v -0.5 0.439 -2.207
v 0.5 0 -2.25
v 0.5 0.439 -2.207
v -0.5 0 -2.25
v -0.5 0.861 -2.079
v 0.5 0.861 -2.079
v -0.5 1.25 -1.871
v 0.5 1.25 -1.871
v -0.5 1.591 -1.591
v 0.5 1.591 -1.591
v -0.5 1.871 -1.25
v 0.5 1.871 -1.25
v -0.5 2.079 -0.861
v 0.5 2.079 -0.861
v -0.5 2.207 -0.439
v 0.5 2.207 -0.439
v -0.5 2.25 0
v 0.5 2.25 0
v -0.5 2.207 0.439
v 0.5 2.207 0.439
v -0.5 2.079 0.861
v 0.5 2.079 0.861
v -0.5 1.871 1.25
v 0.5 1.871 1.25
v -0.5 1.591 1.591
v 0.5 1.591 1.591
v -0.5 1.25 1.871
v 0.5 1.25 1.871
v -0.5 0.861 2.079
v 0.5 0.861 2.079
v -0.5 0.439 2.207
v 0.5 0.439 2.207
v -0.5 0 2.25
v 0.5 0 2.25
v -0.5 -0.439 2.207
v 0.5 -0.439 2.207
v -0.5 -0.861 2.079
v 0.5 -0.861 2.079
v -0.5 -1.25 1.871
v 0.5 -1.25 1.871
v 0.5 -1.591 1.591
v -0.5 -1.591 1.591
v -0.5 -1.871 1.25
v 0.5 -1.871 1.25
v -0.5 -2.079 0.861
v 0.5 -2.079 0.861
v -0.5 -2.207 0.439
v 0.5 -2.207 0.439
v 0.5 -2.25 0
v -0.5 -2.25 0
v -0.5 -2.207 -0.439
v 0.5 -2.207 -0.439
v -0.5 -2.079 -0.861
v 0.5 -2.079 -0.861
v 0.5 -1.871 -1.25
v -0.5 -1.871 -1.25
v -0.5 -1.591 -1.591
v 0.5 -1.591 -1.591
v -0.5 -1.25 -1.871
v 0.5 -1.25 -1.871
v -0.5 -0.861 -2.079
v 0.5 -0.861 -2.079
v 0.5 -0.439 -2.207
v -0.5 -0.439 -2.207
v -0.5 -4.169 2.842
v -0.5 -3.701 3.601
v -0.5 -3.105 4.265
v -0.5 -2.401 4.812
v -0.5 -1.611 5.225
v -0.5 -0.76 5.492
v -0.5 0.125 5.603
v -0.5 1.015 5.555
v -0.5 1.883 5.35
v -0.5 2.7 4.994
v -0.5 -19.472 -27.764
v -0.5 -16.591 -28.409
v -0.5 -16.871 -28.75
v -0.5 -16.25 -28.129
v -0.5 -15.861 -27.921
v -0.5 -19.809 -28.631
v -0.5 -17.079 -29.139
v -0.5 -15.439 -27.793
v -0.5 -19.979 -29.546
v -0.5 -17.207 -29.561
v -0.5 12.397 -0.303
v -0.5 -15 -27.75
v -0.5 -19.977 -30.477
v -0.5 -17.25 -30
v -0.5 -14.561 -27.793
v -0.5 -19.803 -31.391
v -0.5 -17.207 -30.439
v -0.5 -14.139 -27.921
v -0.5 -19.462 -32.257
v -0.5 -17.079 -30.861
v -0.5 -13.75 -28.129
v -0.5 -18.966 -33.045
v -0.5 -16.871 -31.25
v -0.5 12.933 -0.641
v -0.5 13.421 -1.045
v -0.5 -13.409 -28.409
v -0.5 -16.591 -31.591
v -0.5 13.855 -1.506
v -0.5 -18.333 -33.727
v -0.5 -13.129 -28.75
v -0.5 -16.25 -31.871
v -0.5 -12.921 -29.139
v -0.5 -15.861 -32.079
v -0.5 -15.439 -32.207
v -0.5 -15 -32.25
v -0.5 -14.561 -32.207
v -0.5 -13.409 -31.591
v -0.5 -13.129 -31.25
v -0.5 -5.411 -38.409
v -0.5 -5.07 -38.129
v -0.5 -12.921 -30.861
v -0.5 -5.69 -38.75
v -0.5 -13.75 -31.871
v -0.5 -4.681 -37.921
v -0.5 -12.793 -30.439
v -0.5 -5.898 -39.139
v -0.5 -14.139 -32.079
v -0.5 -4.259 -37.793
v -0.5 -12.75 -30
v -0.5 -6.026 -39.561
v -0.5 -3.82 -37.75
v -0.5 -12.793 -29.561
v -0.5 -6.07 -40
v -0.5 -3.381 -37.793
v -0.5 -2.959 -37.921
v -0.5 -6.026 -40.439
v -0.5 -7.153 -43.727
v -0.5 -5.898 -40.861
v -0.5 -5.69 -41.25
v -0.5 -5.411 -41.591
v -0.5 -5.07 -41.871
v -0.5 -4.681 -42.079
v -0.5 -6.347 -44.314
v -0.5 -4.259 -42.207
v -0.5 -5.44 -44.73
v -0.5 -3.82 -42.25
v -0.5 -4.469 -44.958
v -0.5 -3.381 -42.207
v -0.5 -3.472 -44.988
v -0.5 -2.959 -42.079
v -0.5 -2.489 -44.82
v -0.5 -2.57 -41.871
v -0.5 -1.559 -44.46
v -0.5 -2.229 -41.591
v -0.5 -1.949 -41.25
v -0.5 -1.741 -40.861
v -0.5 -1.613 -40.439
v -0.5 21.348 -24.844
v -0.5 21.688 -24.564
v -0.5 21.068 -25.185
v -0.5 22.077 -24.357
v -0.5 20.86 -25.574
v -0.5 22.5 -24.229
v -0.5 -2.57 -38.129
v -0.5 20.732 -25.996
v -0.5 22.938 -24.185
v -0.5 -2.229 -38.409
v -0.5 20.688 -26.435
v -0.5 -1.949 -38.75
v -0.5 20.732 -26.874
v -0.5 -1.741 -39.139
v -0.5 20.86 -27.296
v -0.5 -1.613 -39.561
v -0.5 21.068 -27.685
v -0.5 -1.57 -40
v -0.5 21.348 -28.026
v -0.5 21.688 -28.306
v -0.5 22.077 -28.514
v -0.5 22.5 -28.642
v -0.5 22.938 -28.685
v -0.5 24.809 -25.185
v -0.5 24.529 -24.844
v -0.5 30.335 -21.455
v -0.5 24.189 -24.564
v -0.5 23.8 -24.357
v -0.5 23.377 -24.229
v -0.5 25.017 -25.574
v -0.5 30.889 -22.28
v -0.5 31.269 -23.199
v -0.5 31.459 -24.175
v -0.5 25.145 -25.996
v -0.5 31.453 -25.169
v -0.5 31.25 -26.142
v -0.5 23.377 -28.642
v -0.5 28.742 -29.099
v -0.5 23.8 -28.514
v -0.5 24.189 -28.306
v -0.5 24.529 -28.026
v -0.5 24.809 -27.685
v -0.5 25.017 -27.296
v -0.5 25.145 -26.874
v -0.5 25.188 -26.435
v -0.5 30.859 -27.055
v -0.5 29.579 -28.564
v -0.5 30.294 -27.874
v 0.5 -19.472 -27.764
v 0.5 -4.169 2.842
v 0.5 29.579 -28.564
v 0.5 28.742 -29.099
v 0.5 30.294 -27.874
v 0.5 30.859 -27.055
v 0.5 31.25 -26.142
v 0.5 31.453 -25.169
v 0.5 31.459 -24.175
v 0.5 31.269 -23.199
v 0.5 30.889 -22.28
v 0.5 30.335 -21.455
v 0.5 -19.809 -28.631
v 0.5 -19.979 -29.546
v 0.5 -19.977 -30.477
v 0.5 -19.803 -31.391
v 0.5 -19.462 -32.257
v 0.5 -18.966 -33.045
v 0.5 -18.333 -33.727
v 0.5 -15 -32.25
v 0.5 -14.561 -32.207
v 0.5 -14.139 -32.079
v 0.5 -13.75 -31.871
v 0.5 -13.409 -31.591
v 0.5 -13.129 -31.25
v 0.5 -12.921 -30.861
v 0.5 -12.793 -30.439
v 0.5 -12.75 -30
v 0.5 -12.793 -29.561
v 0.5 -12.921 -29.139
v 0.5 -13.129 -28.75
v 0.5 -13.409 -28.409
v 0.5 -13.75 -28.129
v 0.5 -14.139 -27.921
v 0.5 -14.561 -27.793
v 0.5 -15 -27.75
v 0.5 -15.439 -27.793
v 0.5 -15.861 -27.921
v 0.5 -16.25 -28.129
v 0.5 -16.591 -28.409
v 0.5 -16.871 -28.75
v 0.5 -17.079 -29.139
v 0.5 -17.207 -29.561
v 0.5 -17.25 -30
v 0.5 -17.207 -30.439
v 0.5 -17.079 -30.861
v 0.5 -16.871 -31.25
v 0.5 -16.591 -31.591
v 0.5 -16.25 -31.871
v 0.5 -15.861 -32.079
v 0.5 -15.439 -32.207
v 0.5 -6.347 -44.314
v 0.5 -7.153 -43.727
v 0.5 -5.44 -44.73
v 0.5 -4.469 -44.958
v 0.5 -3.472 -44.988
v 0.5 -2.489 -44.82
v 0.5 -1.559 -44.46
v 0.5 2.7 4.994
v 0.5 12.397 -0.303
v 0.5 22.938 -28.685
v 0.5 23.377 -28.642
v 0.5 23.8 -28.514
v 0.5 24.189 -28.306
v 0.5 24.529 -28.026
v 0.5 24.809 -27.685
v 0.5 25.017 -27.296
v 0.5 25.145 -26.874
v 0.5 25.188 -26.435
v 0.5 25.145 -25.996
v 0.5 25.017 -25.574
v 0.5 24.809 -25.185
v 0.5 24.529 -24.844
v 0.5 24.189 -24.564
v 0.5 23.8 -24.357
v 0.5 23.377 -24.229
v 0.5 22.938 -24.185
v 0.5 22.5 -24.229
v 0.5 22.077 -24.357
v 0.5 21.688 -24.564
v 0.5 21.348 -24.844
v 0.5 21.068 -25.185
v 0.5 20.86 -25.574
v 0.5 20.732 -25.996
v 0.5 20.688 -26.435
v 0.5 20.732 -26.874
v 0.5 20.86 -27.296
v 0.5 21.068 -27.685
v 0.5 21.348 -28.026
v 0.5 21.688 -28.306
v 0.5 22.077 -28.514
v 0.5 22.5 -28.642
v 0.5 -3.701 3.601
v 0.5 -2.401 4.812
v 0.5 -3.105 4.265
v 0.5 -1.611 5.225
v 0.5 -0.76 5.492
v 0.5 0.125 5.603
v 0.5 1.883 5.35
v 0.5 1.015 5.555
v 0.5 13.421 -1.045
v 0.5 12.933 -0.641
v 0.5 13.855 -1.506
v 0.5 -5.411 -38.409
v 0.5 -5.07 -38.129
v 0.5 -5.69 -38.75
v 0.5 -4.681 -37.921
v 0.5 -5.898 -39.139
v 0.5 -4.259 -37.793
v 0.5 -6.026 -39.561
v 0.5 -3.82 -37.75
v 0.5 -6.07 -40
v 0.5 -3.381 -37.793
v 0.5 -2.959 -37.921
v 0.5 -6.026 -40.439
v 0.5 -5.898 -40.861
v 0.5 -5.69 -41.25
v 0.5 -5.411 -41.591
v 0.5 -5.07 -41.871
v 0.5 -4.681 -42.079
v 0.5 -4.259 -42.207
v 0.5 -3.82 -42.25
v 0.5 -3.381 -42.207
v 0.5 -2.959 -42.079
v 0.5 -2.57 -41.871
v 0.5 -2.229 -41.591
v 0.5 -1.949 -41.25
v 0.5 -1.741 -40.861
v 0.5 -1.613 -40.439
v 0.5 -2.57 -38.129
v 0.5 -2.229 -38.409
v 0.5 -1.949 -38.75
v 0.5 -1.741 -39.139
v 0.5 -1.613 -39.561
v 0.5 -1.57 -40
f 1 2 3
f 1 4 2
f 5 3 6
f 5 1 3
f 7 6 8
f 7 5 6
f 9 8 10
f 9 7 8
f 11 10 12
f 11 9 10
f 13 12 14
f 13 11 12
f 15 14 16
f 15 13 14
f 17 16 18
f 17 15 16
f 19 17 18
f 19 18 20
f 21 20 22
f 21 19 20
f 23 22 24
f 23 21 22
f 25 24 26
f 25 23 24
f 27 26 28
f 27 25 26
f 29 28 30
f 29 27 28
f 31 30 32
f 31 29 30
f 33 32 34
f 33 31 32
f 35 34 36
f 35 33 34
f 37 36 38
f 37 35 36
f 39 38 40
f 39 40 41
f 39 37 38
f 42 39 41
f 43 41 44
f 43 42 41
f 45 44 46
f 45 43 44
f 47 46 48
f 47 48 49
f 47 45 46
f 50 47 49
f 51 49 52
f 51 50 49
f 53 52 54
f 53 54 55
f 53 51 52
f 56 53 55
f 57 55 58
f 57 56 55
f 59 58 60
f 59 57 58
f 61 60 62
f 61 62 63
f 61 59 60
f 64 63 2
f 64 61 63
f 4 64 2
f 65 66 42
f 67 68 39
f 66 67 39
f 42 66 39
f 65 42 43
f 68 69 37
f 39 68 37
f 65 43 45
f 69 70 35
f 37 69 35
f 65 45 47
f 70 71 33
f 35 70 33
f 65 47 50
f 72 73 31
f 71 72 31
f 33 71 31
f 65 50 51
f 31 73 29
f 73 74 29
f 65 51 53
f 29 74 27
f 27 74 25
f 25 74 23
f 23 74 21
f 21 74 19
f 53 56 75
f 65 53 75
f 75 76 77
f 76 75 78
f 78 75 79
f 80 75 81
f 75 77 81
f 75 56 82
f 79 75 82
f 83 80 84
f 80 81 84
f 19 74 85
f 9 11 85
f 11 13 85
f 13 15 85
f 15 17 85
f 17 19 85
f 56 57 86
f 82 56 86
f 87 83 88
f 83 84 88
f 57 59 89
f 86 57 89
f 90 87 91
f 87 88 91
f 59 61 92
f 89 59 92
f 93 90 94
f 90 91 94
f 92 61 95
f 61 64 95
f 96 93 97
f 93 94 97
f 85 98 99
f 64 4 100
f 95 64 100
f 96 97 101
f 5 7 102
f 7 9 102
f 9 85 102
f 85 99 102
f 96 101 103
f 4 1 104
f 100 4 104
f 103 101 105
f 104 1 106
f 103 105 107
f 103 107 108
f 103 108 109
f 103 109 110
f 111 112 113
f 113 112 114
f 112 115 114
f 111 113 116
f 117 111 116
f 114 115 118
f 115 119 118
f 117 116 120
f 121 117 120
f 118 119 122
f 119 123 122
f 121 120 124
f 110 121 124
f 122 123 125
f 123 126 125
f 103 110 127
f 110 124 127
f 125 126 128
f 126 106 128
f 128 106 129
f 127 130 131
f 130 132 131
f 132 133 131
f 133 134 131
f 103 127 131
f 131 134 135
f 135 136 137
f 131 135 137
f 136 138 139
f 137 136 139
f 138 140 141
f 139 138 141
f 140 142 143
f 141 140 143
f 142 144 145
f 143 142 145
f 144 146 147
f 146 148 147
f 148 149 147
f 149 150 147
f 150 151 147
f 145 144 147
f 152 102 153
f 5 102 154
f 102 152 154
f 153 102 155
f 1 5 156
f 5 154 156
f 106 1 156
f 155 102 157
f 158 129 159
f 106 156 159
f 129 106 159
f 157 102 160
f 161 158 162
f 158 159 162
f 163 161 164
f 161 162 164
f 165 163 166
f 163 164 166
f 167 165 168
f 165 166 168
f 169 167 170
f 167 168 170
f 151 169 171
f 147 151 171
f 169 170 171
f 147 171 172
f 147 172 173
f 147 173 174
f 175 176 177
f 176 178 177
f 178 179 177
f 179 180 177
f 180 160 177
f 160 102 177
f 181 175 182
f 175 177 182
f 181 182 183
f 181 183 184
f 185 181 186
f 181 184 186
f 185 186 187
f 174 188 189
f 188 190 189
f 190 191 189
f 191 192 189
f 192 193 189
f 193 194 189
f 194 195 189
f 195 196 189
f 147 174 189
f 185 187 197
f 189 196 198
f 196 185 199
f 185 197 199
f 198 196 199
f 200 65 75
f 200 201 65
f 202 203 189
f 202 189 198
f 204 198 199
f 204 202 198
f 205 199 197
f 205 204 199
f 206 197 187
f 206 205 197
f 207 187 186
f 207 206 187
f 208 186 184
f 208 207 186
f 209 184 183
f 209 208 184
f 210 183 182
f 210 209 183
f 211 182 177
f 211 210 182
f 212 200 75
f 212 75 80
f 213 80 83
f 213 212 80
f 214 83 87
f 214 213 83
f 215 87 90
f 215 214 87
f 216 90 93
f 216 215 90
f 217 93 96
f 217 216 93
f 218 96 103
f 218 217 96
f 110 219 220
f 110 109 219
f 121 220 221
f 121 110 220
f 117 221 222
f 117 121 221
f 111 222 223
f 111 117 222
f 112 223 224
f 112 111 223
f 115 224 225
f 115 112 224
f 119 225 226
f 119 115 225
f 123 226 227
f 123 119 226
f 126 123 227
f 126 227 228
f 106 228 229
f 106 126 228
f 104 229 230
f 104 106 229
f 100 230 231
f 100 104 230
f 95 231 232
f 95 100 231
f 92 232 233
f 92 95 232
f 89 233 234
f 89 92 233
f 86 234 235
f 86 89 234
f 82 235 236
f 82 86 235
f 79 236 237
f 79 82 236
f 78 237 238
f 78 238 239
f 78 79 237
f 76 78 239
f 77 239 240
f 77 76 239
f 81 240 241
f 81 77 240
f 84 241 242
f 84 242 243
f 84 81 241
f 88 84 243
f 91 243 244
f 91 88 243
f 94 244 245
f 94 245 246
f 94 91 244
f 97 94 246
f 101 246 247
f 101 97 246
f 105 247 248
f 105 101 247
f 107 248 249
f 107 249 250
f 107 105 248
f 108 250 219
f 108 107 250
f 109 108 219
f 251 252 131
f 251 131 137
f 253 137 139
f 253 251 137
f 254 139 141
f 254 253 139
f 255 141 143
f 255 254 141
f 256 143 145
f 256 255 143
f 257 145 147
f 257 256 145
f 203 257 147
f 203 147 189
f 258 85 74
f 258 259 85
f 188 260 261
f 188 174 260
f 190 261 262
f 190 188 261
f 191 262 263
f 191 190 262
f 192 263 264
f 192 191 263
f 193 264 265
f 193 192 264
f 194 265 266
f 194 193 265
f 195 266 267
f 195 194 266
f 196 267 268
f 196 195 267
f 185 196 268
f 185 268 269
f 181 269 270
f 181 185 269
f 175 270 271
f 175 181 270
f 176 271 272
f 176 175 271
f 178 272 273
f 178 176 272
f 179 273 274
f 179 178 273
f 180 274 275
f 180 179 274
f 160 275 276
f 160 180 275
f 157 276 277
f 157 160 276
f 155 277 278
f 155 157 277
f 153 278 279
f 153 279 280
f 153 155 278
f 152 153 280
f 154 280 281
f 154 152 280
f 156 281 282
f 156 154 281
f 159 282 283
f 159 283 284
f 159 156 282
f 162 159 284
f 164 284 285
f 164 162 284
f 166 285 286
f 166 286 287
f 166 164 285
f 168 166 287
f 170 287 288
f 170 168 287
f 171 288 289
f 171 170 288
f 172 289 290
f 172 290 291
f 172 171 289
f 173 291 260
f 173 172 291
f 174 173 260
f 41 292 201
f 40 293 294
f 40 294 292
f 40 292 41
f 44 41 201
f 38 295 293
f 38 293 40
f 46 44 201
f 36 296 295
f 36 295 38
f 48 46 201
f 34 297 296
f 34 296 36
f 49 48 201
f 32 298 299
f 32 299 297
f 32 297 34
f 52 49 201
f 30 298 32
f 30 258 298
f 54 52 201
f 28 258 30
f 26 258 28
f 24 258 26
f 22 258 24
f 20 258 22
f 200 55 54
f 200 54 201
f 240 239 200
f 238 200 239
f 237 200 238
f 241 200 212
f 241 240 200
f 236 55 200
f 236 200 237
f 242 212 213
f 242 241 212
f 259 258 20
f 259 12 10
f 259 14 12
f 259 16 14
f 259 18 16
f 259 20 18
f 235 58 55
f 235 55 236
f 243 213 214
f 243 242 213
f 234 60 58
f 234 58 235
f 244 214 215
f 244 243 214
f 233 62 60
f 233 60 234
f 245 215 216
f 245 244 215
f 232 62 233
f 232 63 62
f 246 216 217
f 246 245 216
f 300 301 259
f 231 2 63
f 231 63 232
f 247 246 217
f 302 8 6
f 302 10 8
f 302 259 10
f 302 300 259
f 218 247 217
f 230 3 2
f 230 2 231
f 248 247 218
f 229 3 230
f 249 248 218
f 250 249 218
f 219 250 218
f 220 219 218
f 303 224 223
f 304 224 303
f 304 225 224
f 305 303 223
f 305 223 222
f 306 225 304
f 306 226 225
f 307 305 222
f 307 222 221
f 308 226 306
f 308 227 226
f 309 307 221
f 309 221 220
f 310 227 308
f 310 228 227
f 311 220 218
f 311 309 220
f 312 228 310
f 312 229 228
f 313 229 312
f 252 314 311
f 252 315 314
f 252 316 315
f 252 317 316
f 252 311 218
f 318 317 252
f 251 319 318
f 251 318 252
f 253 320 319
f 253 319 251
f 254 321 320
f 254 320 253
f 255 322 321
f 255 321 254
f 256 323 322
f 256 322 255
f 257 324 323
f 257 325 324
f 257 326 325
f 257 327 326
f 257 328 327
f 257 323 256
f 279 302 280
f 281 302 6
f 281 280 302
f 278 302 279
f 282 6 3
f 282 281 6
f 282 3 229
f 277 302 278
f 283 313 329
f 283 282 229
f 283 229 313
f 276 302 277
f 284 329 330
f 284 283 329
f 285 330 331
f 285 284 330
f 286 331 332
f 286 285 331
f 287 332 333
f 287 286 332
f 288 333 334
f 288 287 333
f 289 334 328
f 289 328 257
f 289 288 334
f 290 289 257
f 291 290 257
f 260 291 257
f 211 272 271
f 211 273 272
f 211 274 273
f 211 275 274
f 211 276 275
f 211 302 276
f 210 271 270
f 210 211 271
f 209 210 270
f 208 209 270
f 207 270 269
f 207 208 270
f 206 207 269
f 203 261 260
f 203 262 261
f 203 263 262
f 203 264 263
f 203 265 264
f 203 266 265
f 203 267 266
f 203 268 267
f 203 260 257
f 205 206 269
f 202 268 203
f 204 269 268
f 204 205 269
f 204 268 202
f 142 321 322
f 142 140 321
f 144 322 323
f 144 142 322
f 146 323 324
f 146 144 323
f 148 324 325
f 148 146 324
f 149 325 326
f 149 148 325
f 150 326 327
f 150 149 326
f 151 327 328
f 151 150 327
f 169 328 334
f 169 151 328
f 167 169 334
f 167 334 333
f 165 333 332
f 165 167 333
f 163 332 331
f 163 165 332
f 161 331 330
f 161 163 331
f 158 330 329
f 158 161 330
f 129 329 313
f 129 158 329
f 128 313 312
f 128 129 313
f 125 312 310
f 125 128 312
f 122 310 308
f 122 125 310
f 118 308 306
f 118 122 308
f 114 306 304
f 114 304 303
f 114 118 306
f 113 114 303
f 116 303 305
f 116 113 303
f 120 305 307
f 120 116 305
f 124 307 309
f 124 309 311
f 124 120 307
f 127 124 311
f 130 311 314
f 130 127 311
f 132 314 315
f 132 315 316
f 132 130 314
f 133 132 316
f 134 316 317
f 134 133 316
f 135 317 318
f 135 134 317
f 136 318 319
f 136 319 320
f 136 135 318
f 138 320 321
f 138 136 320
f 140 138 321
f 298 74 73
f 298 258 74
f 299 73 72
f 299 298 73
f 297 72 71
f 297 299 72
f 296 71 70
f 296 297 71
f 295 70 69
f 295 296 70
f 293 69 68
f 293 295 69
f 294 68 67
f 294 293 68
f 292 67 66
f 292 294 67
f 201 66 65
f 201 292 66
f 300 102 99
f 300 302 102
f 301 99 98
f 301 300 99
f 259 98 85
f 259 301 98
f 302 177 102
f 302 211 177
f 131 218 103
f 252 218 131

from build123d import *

# Parameters (mm, degrees)
SKETCH1_R           = 2.25
BOSS_EXTRUDE1_DEPTH = 0.5


with BuildPart() as part:
    # Sketch1 → Boss-Extrude1 (new body, symmetric)
    with BuildSketch(Plane(origin=(0, 0, 0), x_dir=(0, 0, -1), z_dir=(1, 0, 0))):
        with BuildLine():
            Line((-2.842316383, -4.169011752), (27.763932023, -19.472135955))
            ThreePointArc((27.763932023, -19.472135955), (30.93796237, -19.911234732), (33.726779962, -18.333333333))
            Line((33.726779962, -18.333333333), (43.726779962, -7.152993446))
            ThreePointArc((43.726779962, -7.152993446), (44.957632334, -4.469184277), (44.459693025, -1.558877478))
            Line((44.459693025, -1.558877478), (29.09925887, 28.74161228))
            ThreePointArc((29.09925887, 28.74161228), (25.660151825, 31.375561942), (21.454986898, 30.335496549))
            Line((21.454986898, 30.335496549), (1.506318758, 13.854666903))
            ThreePointArc((1.506318758, 13.854666903), (0.835117993, 13.183231504), (0.302931344, 12.397029665))
            Line((0.302931344, 12.397029665), (-4.994214766, 2.700153867))
            ThreePointArc((-4.994214766, 2.700153867), (-5.377602176, -1.19159423), (-2.842316383, -4.169011752))
        make_face()
        with Locations((30, -15)):
            Circle(SKETCH1_R, mode=Mode.SUBTRACT)
        with Locations((40, -3.819660113)):
            Circle(SKETCH1_R, mode=Mode.SUBTRACT)
        Circle(SKETCH1_R, mode=Mode.SUBTRACT)
        with Locations((26.435304192, 22.938498039)):
            Circle(SKETCH1_R, mode=Mode.SUBTRACT)
    extrude(amount=BOSS_EXTRUDE1_DEPTH, both=True)


solid = part.part
